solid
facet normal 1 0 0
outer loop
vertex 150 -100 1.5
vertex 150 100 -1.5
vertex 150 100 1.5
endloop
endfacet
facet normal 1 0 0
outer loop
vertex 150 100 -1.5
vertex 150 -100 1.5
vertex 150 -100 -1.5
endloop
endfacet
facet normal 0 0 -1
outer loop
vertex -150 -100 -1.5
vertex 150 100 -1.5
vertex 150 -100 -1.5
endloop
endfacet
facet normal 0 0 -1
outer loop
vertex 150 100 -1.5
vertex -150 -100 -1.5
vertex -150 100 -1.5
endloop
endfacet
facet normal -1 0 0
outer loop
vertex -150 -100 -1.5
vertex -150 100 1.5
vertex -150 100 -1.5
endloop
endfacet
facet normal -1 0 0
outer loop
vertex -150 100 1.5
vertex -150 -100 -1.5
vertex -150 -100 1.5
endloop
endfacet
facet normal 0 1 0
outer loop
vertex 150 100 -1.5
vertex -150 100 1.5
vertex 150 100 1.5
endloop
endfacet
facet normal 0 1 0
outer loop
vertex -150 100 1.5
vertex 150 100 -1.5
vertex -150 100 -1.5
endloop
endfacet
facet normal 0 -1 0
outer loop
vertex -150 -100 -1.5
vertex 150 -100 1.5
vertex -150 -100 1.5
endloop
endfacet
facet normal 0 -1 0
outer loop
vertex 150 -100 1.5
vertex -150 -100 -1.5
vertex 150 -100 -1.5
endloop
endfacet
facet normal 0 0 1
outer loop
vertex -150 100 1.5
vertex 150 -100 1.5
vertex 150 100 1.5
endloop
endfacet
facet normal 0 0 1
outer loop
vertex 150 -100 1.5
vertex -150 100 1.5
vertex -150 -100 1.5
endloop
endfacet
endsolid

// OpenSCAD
$fn = 64;

// DiBond sheet (aluminum skins + composite core) as ONE connected solid
sheet_length    = 300;
sheet_width     = 200;
sheet_thickness = 3;

// Typical DiBond construction: ~0.3 mm aluminum skins each side
skin_t = 0.3;
eps    = 0.05; // small overlap to guarantee manifold connectivity

module dibond_sheet(L, W, T, skin, overlap=0.05) {
    core = T - 2*skin;
    assert(core > 0, "skin thickness too large for total thickness");

    // Center the whole sheet at origin so it is always visible and well-framed
    translate([0, 0, -T/2])
    union() {
        // Bottom aluminum skin (slightly overlaps into core)
        color([0.80, 0.80, 0.83])
            translate([-L/2, -W/2, 0])
                cube([L, W, skin + overlap], center=false);

        // Core (overlaps into both skins)
        color([0.15, 0.15, 0.15])
            translate([-L/2, -W/2, skin - overlap])
                cube([L, W, core + 2*overlap], center=false);

        // Top aluminum skin (slightly overlaps into core)
        color([0.80, 0.80, 0.83])
            translate([-L/2, -W/2, skin + core - overlap])
                cube([L, W, skin + overlap], center=false);
    }
}

dibond_sheet(sheet_length, sheet_width, sheet_thickness, skin_t, eps);
